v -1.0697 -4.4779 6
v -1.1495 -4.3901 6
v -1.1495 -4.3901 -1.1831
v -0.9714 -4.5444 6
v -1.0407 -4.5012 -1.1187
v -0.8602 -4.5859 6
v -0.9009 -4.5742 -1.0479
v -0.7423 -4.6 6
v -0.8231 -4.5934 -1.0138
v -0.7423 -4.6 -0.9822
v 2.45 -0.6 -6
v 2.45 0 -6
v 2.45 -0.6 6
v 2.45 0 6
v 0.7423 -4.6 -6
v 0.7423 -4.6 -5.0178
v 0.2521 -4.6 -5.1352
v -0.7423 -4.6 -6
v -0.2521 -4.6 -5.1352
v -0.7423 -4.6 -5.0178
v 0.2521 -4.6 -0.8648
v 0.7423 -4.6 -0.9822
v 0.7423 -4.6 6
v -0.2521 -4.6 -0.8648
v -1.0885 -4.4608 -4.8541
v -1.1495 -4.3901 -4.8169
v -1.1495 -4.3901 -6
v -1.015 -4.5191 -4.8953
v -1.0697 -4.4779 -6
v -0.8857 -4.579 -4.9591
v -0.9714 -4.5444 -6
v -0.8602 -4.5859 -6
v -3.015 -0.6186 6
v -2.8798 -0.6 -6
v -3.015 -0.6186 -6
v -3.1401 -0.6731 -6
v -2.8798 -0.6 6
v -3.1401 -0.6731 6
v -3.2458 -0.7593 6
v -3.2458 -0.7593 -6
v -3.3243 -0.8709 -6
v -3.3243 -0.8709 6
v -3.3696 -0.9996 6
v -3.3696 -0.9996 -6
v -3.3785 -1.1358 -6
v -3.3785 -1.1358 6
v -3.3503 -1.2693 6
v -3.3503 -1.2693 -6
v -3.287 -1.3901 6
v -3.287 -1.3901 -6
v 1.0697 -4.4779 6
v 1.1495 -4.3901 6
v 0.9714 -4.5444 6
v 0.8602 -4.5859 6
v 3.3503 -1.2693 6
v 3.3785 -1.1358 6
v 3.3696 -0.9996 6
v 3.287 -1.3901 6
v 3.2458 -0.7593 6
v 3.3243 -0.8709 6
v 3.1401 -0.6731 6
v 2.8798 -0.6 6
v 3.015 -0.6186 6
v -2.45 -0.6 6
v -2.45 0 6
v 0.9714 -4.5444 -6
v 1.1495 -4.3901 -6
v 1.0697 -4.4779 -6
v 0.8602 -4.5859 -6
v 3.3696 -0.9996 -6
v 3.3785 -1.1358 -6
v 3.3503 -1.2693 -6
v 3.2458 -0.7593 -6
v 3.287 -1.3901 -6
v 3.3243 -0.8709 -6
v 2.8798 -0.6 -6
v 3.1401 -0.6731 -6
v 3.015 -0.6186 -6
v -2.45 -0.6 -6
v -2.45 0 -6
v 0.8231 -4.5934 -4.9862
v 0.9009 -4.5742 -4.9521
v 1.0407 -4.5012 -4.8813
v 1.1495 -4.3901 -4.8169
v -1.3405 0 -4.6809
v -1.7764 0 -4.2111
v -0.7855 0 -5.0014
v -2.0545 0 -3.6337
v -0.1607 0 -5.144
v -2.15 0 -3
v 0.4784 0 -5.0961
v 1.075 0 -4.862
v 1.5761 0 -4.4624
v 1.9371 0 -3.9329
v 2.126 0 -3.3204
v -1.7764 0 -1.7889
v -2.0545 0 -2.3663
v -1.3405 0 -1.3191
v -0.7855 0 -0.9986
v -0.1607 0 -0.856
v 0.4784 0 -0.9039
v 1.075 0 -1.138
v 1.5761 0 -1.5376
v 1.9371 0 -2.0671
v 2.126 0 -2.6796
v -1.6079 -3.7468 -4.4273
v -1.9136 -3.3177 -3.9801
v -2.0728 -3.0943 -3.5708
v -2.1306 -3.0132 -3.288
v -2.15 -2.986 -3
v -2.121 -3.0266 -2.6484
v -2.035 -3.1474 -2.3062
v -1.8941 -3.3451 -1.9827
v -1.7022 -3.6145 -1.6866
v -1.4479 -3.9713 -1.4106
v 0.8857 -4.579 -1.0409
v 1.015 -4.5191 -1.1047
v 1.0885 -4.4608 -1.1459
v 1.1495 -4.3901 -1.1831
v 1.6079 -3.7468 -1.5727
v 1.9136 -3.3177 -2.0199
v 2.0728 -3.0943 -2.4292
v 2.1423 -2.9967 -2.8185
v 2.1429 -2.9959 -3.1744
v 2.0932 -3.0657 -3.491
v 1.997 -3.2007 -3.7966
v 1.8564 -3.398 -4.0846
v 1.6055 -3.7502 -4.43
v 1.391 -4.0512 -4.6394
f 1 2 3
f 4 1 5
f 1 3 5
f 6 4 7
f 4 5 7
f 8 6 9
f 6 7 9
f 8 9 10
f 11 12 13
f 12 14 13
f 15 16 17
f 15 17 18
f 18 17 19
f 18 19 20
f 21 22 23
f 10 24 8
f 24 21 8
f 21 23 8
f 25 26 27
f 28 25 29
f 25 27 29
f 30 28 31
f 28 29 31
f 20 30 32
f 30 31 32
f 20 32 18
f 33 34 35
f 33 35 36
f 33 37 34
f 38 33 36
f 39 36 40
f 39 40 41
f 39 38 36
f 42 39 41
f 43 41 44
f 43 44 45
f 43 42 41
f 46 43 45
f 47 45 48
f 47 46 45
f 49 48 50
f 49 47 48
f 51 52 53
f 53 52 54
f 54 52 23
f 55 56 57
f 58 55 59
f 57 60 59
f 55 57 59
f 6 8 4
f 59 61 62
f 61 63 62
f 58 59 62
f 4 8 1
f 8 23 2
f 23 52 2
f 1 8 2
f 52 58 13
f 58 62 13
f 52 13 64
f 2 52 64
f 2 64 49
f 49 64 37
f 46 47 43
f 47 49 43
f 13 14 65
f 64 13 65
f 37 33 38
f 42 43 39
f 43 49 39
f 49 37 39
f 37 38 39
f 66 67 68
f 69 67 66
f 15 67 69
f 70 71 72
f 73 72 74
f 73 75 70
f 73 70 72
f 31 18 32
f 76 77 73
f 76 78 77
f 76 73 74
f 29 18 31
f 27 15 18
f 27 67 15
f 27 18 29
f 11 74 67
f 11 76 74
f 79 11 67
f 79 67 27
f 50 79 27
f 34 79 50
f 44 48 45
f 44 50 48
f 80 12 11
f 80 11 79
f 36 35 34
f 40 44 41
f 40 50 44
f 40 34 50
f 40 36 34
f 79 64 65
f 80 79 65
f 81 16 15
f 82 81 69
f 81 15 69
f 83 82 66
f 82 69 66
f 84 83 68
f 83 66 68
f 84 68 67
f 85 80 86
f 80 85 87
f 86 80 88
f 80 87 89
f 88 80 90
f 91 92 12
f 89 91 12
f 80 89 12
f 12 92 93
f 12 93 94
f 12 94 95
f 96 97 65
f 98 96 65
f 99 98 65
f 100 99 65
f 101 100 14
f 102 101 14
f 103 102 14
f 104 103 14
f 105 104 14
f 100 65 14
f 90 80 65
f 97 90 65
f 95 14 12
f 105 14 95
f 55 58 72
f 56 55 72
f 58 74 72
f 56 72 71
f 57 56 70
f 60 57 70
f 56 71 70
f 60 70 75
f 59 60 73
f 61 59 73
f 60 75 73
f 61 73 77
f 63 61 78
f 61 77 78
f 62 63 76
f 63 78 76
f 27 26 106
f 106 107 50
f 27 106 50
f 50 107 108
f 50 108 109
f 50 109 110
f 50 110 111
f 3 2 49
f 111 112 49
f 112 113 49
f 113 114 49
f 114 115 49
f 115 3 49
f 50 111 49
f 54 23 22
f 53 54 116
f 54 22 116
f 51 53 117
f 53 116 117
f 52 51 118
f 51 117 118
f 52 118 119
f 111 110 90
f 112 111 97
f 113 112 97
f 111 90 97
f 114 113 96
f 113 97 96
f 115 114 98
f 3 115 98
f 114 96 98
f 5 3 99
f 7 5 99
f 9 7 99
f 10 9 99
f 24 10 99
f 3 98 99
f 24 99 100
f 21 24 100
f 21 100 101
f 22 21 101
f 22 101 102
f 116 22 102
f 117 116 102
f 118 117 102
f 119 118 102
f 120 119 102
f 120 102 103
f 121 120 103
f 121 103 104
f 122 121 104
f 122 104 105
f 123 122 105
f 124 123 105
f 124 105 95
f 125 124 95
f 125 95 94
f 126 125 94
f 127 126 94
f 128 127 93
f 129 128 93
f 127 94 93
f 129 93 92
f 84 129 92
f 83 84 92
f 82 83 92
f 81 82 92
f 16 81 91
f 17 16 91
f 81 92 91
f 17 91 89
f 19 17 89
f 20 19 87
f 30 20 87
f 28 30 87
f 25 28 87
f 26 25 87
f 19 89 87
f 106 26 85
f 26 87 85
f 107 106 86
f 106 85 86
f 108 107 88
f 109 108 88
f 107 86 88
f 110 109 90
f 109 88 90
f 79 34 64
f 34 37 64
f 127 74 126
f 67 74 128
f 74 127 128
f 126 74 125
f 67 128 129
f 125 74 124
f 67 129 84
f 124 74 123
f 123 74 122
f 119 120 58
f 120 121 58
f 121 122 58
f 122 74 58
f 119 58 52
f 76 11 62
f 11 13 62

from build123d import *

# Parameters (mm, degrees)
BOSS_EXTRU_1_DEPTH      = 6
CONG_1_R                = 0.5
ENL_V_MAT_EXTRU_1_REACH = 10.281
ESQUISSE2_R             = 2.15


with BuildPart() as part:
    # Esquisse1 → Boss.-Extru.1 (new, symmetric)
    with BuildSketch(Plane.XY):
        Polygon((-2.45, 0), (2.45, 0), (2.45, -0.6), (3.85, -0.6), (1, -4.6), (-1, -4.6), (-3.85, -0.6), (-2.45, -0.6), align=None)
    extrude(amount=BOSS_EXTRU_1_DEPTH, both=True)

    # Congé1
    cong_1_edges = [part.edges().sort_by_distance(p)[0] for p in [
        (3.85, -0.6, 0),
        (1, -4.6, 0),
        (-1, -4.6, 0),
        (-3.85, -0.6, 0),
    ]]
    fillet(cong_1_edges, radius=CONG_1_R)

    # Esquisse2 → Enlèv. mat.-Extru.1 (cut, up to next)
    with BuildSketch(Plane(origin=(0, 0, 0), x_dir=(1, 0, 0), z_dir=(0, 1, 0)), mode=Mode.PRIVATE) as enl_v_mat_extru_1_sk1:
        with Locations(Location((0, 3, 0), (0, 0, 180))):
            Circle(ESQUISSE2_R)
    enl_v_mat_extru_1_tool1 = extrude(enl_v_mat_extru_1_sk1.sketch, amount=-ENL_V_MAT_EXTRU_1_REACH, mode=Mode.PRIVATE) & part.part
    add(enl_v_mat_extru_1_tool1.solids().sort_by_distance((0, 0, -3))[0], mode=Mode.SUBTRACT)


solid = part.part
